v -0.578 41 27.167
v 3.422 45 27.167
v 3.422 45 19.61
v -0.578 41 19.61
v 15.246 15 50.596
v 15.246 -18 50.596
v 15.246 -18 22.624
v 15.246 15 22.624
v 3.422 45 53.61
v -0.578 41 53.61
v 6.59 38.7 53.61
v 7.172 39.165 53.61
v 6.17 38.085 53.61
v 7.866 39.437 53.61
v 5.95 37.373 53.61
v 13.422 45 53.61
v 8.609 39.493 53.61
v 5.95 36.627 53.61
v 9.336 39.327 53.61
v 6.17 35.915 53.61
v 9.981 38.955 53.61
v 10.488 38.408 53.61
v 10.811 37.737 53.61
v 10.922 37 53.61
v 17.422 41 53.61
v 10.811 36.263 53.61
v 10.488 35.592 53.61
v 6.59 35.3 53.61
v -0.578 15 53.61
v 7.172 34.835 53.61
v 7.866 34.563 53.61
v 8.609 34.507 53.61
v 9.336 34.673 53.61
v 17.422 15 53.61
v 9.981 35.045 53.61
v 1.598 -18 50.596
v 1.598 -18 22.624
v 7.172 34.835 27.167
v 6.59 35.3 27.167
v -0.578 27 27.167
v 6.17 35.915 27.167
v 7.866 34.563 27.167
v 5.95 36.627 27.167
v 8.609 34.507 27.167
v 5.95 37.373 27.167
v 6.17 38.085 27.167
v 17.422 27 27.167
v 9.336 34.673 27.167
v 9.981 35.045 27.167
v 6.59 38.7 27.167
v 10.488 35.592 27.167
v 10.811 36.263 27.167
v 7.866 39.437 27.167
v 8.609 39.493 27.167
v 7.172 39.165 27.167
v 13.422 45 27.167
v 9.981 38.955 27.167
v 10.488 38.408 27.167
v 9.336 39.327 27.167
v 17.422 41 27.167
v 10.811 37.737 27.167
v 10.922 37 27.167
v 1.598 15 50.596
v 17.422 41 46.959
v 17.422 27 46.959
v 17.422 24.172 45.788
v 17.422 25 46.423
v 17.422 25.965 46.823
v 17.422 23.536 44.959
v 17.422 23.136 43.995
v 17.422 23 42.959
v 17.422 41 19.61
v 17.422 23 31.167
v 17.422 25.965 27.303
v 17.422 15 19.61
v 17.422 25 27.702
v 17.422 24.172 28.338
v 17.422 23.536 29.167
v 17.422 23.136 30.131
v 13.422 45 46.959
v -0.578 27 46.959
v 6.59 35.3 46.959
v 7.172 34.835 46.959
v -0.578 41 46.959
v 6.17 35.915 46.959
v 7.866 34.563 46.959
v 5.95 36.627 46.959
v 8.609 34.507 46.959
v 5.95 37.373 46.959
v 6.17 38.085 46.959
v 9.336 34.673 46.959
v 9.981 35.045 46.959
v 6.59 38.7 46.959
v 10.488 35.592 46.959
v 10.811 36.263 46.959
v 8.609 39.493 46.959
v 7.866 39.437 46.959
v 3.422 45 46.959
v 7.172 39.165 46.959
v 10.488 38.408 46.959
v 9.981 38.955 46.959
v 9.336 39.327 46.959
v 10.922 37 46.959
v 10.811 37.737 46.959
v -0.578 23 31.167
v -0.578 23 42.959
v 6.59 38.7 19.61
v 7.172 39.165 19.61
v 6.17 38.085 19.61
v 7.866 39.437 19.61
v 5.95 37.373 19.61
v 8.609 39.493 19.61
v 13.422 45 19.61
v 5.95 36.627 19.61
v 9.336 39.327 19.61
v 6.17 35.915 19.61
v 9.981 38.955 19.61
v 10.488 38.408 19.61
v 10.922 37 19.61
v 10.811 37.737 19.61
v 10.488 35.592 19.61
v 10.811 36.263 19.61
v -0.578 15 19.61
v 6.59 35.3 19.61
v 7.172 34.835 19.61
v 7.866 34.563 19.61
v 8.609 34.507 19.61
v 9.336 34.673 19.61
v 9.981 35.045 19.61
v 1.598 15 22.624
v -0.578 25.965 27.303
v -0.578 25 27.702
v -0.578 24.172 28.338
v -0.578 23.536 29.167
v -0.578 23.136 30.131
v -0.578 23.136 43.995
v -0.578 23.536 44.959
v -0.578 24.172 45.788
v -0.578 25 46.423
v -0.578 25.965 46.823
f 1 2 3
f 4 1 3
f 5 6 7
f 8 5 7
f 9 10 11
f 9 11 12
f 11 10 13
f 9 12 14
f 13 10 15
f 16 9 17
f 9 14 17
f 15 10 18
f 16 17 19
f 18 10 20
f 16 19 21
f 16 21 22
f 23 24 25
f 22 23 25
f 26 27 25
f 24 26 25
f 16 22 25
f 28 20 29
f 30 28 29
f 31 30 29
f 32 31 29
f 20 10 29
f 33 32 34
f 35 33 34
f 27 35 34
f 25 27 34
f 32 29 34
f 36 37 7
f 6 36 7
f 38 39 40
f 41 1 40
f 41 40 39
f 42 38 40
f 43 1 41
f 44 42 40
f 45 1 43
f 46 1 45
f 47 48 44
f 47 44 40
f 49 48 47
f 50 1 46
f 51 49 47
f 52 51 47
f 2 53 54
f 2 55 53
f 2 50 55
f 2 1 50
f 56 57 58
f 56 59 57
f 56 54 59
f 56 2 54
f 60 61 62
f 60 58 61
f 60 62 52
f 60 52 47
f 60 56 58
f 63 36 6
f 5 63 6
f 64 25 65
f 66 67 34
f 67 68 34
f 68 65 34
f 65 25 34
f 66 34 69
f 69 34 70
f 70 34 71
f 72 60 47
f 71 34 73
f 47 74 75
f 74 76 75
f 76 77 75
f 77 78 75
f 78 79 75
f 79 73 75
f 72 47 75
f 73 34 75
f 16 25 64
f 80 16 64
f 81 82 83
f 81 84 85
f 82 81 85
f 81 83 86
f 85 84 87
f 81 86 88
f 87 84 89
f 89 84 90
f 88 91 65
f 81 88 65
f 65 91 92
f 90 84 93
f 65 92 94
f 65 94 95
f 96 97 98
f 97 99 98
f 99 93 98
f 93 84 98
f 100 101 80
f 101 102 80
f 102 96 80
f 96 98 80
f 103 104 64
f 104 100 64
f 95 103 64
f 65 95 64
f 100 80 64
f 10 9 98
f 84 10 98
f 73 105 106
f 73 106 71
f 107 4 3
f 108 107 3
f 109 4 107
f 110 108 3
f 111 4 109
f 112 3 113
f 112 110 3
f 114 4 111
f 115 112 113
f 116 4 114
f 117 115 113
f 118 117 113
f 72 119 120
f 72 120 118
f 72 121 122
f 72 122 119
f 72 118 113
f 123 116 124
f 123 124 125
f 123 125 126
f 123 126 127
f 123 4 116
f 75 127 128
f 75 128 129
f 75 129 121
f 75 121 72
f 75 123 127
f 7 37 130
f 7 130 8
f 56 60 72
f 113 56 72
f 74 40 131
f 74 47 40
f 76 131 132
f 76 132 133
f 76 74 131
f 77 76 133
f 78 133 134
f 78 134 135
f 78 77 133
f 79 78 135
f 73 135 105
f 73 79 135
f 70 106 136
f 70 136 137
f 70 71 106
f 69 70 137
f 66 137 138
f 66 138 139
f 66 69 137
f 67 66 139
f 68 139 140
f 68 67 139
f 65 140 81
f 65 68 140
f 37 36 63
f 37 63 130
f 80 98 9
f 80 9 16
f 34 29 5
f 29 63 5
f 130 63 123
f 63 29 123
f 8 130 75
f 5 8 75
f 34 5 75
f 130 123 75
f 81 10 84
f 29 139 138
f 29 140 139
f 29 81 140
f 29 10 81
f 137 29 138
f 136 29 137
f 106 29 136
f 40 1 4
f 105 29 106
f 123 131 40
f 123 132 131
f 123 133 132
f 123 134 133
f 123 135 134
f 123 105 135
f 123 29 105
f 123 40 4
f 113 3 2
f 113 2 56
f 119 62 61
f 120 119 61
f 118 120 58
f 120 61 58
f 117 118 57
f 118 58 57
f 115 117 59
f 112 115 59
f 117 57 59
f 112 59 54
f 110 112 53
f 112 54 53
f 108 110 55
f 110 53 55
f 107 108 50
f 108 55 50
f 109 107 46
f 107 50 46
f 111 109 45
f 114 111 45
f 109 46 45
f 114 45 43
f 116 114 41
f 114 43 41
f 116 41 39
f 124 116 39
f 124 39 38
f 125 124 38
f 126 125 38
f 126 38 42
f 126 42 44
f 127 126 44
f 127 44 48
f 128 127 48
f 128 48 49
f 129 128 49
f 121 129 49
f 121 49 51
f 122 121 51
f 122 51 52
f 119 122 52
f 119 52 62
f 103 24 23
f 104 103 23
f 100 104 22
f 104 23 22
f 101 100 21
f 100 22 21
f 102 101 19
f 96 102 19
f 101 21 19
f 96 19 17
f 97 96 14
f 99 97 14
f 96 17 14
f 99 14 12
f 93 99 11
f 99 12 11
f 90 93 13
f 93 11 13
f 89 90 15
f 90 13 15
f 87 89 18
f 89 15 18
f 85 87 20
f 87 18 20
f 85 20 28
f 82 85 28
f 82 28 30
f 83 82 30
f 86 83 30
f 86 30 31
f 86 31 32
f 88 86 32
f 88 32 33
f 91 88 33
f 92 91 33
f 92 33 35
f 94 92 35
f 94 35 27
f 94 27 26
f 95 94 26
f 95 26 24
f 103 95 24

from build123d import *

# Parameters (mm, degrees)
EXTRUDE_START       = -18
SKETCH_1_W          = 13.648314944
SKETCH_1_H          = 27.972083639
EXTRUDE_1_DEPTH     = 33
SKETCH_3_W          = 18
SKETCH_3_H          = 34
EXTRUDE_2_DEPTH     = 30
SKETCH_4_W          = 20.982707523
SKETCH_4_H          = 19.792714352
CUT_EXTRUDE_1_DEPTH = 22
FILLET_1_R          = 4
SKETCH_5_R          = 2.5
CUT_EXTRUDE_2_DEPTH = 60.029924153
CHAMFER_1_SIZE      = 4


with BuildPart() as part:
    # Эскиз1 → Вытянуть1 (new body)
    with BuildSketch(Plane(origin=(0, 0, 0), x_dir=(1, 0, 0), z_dir=(0, 1, 0)).offset(EXTRUDE_START)):
        with Locations((8.422168222, -36.610171765)):
            Rectangle(SKETCH_1_W, SKETCH_1_H)
    extrude(amount=EXTRUDE_1_DEPTH)

    # Эскиз3 → Вытянуть2 (add)
    with BuildSketch(Plane(origin=(0, 15, 0), x_dir=(1, 0, 0), z_dir=(0, 1, 0))):
        with Locations((8.422168222, -36.610171766)):
            Rectangle(SKETCH_3_W, SKETCH_3_H)
    extrude(amount=EXTRUDE_2_DEPTH)

    # Эскиз4 → Вырез-Вытянуть1 (cut)
    with BuildSketch(Plane(origin=(0, 45, 0), x_dir=(1, 0, 0), z_dir=(0, 1, 0))):
        with Locations((9.143949352, -37.062876014)):
            Rectangle(SKETCH_4_W, SKETCH_4_H)
    extrude(amount=-CUT_EXTRUDE_1_DEPTH, mode=Mode.SUBTRACT)

    # Скругление1
    fillet_1_edges = [part.edges().sort_by_distance(p)[0] for p in [
        (8.422168222, 23, 27.166518838),
        (8.422168222, 23, 46.95923319),
    ]]
    fillet(fillet_1_edges, radius=FILLET_1_R)

    # Эскиз5 → Вырез-Вытянуть2 (cut, through all)
    with BuildSketch(Plane.XY.offset(53.610171766)):
        with Locations((8.422168222, 37)):
            Circle(SKETCH_5_R)
    extrude(amount=-CUT_EXTRUDE_2_DEPTH, mode=Mode.SUBTRACT)

    # Фаска1
    chamfer_1_edges = [part.edges().sort_by_distance(p)[0] for p in [
        (-0.577831778, 45, 23.388345302),
        (17.422168222, 45, 50.284702478),
        (-0.577831778, 45, 50.284702478),
        (17.422168222, 45, 23.388345302),
    ]]
    chamfer(chamfer_1_edges, length=CHAMFER_1_SIZE)


solid = part.part
